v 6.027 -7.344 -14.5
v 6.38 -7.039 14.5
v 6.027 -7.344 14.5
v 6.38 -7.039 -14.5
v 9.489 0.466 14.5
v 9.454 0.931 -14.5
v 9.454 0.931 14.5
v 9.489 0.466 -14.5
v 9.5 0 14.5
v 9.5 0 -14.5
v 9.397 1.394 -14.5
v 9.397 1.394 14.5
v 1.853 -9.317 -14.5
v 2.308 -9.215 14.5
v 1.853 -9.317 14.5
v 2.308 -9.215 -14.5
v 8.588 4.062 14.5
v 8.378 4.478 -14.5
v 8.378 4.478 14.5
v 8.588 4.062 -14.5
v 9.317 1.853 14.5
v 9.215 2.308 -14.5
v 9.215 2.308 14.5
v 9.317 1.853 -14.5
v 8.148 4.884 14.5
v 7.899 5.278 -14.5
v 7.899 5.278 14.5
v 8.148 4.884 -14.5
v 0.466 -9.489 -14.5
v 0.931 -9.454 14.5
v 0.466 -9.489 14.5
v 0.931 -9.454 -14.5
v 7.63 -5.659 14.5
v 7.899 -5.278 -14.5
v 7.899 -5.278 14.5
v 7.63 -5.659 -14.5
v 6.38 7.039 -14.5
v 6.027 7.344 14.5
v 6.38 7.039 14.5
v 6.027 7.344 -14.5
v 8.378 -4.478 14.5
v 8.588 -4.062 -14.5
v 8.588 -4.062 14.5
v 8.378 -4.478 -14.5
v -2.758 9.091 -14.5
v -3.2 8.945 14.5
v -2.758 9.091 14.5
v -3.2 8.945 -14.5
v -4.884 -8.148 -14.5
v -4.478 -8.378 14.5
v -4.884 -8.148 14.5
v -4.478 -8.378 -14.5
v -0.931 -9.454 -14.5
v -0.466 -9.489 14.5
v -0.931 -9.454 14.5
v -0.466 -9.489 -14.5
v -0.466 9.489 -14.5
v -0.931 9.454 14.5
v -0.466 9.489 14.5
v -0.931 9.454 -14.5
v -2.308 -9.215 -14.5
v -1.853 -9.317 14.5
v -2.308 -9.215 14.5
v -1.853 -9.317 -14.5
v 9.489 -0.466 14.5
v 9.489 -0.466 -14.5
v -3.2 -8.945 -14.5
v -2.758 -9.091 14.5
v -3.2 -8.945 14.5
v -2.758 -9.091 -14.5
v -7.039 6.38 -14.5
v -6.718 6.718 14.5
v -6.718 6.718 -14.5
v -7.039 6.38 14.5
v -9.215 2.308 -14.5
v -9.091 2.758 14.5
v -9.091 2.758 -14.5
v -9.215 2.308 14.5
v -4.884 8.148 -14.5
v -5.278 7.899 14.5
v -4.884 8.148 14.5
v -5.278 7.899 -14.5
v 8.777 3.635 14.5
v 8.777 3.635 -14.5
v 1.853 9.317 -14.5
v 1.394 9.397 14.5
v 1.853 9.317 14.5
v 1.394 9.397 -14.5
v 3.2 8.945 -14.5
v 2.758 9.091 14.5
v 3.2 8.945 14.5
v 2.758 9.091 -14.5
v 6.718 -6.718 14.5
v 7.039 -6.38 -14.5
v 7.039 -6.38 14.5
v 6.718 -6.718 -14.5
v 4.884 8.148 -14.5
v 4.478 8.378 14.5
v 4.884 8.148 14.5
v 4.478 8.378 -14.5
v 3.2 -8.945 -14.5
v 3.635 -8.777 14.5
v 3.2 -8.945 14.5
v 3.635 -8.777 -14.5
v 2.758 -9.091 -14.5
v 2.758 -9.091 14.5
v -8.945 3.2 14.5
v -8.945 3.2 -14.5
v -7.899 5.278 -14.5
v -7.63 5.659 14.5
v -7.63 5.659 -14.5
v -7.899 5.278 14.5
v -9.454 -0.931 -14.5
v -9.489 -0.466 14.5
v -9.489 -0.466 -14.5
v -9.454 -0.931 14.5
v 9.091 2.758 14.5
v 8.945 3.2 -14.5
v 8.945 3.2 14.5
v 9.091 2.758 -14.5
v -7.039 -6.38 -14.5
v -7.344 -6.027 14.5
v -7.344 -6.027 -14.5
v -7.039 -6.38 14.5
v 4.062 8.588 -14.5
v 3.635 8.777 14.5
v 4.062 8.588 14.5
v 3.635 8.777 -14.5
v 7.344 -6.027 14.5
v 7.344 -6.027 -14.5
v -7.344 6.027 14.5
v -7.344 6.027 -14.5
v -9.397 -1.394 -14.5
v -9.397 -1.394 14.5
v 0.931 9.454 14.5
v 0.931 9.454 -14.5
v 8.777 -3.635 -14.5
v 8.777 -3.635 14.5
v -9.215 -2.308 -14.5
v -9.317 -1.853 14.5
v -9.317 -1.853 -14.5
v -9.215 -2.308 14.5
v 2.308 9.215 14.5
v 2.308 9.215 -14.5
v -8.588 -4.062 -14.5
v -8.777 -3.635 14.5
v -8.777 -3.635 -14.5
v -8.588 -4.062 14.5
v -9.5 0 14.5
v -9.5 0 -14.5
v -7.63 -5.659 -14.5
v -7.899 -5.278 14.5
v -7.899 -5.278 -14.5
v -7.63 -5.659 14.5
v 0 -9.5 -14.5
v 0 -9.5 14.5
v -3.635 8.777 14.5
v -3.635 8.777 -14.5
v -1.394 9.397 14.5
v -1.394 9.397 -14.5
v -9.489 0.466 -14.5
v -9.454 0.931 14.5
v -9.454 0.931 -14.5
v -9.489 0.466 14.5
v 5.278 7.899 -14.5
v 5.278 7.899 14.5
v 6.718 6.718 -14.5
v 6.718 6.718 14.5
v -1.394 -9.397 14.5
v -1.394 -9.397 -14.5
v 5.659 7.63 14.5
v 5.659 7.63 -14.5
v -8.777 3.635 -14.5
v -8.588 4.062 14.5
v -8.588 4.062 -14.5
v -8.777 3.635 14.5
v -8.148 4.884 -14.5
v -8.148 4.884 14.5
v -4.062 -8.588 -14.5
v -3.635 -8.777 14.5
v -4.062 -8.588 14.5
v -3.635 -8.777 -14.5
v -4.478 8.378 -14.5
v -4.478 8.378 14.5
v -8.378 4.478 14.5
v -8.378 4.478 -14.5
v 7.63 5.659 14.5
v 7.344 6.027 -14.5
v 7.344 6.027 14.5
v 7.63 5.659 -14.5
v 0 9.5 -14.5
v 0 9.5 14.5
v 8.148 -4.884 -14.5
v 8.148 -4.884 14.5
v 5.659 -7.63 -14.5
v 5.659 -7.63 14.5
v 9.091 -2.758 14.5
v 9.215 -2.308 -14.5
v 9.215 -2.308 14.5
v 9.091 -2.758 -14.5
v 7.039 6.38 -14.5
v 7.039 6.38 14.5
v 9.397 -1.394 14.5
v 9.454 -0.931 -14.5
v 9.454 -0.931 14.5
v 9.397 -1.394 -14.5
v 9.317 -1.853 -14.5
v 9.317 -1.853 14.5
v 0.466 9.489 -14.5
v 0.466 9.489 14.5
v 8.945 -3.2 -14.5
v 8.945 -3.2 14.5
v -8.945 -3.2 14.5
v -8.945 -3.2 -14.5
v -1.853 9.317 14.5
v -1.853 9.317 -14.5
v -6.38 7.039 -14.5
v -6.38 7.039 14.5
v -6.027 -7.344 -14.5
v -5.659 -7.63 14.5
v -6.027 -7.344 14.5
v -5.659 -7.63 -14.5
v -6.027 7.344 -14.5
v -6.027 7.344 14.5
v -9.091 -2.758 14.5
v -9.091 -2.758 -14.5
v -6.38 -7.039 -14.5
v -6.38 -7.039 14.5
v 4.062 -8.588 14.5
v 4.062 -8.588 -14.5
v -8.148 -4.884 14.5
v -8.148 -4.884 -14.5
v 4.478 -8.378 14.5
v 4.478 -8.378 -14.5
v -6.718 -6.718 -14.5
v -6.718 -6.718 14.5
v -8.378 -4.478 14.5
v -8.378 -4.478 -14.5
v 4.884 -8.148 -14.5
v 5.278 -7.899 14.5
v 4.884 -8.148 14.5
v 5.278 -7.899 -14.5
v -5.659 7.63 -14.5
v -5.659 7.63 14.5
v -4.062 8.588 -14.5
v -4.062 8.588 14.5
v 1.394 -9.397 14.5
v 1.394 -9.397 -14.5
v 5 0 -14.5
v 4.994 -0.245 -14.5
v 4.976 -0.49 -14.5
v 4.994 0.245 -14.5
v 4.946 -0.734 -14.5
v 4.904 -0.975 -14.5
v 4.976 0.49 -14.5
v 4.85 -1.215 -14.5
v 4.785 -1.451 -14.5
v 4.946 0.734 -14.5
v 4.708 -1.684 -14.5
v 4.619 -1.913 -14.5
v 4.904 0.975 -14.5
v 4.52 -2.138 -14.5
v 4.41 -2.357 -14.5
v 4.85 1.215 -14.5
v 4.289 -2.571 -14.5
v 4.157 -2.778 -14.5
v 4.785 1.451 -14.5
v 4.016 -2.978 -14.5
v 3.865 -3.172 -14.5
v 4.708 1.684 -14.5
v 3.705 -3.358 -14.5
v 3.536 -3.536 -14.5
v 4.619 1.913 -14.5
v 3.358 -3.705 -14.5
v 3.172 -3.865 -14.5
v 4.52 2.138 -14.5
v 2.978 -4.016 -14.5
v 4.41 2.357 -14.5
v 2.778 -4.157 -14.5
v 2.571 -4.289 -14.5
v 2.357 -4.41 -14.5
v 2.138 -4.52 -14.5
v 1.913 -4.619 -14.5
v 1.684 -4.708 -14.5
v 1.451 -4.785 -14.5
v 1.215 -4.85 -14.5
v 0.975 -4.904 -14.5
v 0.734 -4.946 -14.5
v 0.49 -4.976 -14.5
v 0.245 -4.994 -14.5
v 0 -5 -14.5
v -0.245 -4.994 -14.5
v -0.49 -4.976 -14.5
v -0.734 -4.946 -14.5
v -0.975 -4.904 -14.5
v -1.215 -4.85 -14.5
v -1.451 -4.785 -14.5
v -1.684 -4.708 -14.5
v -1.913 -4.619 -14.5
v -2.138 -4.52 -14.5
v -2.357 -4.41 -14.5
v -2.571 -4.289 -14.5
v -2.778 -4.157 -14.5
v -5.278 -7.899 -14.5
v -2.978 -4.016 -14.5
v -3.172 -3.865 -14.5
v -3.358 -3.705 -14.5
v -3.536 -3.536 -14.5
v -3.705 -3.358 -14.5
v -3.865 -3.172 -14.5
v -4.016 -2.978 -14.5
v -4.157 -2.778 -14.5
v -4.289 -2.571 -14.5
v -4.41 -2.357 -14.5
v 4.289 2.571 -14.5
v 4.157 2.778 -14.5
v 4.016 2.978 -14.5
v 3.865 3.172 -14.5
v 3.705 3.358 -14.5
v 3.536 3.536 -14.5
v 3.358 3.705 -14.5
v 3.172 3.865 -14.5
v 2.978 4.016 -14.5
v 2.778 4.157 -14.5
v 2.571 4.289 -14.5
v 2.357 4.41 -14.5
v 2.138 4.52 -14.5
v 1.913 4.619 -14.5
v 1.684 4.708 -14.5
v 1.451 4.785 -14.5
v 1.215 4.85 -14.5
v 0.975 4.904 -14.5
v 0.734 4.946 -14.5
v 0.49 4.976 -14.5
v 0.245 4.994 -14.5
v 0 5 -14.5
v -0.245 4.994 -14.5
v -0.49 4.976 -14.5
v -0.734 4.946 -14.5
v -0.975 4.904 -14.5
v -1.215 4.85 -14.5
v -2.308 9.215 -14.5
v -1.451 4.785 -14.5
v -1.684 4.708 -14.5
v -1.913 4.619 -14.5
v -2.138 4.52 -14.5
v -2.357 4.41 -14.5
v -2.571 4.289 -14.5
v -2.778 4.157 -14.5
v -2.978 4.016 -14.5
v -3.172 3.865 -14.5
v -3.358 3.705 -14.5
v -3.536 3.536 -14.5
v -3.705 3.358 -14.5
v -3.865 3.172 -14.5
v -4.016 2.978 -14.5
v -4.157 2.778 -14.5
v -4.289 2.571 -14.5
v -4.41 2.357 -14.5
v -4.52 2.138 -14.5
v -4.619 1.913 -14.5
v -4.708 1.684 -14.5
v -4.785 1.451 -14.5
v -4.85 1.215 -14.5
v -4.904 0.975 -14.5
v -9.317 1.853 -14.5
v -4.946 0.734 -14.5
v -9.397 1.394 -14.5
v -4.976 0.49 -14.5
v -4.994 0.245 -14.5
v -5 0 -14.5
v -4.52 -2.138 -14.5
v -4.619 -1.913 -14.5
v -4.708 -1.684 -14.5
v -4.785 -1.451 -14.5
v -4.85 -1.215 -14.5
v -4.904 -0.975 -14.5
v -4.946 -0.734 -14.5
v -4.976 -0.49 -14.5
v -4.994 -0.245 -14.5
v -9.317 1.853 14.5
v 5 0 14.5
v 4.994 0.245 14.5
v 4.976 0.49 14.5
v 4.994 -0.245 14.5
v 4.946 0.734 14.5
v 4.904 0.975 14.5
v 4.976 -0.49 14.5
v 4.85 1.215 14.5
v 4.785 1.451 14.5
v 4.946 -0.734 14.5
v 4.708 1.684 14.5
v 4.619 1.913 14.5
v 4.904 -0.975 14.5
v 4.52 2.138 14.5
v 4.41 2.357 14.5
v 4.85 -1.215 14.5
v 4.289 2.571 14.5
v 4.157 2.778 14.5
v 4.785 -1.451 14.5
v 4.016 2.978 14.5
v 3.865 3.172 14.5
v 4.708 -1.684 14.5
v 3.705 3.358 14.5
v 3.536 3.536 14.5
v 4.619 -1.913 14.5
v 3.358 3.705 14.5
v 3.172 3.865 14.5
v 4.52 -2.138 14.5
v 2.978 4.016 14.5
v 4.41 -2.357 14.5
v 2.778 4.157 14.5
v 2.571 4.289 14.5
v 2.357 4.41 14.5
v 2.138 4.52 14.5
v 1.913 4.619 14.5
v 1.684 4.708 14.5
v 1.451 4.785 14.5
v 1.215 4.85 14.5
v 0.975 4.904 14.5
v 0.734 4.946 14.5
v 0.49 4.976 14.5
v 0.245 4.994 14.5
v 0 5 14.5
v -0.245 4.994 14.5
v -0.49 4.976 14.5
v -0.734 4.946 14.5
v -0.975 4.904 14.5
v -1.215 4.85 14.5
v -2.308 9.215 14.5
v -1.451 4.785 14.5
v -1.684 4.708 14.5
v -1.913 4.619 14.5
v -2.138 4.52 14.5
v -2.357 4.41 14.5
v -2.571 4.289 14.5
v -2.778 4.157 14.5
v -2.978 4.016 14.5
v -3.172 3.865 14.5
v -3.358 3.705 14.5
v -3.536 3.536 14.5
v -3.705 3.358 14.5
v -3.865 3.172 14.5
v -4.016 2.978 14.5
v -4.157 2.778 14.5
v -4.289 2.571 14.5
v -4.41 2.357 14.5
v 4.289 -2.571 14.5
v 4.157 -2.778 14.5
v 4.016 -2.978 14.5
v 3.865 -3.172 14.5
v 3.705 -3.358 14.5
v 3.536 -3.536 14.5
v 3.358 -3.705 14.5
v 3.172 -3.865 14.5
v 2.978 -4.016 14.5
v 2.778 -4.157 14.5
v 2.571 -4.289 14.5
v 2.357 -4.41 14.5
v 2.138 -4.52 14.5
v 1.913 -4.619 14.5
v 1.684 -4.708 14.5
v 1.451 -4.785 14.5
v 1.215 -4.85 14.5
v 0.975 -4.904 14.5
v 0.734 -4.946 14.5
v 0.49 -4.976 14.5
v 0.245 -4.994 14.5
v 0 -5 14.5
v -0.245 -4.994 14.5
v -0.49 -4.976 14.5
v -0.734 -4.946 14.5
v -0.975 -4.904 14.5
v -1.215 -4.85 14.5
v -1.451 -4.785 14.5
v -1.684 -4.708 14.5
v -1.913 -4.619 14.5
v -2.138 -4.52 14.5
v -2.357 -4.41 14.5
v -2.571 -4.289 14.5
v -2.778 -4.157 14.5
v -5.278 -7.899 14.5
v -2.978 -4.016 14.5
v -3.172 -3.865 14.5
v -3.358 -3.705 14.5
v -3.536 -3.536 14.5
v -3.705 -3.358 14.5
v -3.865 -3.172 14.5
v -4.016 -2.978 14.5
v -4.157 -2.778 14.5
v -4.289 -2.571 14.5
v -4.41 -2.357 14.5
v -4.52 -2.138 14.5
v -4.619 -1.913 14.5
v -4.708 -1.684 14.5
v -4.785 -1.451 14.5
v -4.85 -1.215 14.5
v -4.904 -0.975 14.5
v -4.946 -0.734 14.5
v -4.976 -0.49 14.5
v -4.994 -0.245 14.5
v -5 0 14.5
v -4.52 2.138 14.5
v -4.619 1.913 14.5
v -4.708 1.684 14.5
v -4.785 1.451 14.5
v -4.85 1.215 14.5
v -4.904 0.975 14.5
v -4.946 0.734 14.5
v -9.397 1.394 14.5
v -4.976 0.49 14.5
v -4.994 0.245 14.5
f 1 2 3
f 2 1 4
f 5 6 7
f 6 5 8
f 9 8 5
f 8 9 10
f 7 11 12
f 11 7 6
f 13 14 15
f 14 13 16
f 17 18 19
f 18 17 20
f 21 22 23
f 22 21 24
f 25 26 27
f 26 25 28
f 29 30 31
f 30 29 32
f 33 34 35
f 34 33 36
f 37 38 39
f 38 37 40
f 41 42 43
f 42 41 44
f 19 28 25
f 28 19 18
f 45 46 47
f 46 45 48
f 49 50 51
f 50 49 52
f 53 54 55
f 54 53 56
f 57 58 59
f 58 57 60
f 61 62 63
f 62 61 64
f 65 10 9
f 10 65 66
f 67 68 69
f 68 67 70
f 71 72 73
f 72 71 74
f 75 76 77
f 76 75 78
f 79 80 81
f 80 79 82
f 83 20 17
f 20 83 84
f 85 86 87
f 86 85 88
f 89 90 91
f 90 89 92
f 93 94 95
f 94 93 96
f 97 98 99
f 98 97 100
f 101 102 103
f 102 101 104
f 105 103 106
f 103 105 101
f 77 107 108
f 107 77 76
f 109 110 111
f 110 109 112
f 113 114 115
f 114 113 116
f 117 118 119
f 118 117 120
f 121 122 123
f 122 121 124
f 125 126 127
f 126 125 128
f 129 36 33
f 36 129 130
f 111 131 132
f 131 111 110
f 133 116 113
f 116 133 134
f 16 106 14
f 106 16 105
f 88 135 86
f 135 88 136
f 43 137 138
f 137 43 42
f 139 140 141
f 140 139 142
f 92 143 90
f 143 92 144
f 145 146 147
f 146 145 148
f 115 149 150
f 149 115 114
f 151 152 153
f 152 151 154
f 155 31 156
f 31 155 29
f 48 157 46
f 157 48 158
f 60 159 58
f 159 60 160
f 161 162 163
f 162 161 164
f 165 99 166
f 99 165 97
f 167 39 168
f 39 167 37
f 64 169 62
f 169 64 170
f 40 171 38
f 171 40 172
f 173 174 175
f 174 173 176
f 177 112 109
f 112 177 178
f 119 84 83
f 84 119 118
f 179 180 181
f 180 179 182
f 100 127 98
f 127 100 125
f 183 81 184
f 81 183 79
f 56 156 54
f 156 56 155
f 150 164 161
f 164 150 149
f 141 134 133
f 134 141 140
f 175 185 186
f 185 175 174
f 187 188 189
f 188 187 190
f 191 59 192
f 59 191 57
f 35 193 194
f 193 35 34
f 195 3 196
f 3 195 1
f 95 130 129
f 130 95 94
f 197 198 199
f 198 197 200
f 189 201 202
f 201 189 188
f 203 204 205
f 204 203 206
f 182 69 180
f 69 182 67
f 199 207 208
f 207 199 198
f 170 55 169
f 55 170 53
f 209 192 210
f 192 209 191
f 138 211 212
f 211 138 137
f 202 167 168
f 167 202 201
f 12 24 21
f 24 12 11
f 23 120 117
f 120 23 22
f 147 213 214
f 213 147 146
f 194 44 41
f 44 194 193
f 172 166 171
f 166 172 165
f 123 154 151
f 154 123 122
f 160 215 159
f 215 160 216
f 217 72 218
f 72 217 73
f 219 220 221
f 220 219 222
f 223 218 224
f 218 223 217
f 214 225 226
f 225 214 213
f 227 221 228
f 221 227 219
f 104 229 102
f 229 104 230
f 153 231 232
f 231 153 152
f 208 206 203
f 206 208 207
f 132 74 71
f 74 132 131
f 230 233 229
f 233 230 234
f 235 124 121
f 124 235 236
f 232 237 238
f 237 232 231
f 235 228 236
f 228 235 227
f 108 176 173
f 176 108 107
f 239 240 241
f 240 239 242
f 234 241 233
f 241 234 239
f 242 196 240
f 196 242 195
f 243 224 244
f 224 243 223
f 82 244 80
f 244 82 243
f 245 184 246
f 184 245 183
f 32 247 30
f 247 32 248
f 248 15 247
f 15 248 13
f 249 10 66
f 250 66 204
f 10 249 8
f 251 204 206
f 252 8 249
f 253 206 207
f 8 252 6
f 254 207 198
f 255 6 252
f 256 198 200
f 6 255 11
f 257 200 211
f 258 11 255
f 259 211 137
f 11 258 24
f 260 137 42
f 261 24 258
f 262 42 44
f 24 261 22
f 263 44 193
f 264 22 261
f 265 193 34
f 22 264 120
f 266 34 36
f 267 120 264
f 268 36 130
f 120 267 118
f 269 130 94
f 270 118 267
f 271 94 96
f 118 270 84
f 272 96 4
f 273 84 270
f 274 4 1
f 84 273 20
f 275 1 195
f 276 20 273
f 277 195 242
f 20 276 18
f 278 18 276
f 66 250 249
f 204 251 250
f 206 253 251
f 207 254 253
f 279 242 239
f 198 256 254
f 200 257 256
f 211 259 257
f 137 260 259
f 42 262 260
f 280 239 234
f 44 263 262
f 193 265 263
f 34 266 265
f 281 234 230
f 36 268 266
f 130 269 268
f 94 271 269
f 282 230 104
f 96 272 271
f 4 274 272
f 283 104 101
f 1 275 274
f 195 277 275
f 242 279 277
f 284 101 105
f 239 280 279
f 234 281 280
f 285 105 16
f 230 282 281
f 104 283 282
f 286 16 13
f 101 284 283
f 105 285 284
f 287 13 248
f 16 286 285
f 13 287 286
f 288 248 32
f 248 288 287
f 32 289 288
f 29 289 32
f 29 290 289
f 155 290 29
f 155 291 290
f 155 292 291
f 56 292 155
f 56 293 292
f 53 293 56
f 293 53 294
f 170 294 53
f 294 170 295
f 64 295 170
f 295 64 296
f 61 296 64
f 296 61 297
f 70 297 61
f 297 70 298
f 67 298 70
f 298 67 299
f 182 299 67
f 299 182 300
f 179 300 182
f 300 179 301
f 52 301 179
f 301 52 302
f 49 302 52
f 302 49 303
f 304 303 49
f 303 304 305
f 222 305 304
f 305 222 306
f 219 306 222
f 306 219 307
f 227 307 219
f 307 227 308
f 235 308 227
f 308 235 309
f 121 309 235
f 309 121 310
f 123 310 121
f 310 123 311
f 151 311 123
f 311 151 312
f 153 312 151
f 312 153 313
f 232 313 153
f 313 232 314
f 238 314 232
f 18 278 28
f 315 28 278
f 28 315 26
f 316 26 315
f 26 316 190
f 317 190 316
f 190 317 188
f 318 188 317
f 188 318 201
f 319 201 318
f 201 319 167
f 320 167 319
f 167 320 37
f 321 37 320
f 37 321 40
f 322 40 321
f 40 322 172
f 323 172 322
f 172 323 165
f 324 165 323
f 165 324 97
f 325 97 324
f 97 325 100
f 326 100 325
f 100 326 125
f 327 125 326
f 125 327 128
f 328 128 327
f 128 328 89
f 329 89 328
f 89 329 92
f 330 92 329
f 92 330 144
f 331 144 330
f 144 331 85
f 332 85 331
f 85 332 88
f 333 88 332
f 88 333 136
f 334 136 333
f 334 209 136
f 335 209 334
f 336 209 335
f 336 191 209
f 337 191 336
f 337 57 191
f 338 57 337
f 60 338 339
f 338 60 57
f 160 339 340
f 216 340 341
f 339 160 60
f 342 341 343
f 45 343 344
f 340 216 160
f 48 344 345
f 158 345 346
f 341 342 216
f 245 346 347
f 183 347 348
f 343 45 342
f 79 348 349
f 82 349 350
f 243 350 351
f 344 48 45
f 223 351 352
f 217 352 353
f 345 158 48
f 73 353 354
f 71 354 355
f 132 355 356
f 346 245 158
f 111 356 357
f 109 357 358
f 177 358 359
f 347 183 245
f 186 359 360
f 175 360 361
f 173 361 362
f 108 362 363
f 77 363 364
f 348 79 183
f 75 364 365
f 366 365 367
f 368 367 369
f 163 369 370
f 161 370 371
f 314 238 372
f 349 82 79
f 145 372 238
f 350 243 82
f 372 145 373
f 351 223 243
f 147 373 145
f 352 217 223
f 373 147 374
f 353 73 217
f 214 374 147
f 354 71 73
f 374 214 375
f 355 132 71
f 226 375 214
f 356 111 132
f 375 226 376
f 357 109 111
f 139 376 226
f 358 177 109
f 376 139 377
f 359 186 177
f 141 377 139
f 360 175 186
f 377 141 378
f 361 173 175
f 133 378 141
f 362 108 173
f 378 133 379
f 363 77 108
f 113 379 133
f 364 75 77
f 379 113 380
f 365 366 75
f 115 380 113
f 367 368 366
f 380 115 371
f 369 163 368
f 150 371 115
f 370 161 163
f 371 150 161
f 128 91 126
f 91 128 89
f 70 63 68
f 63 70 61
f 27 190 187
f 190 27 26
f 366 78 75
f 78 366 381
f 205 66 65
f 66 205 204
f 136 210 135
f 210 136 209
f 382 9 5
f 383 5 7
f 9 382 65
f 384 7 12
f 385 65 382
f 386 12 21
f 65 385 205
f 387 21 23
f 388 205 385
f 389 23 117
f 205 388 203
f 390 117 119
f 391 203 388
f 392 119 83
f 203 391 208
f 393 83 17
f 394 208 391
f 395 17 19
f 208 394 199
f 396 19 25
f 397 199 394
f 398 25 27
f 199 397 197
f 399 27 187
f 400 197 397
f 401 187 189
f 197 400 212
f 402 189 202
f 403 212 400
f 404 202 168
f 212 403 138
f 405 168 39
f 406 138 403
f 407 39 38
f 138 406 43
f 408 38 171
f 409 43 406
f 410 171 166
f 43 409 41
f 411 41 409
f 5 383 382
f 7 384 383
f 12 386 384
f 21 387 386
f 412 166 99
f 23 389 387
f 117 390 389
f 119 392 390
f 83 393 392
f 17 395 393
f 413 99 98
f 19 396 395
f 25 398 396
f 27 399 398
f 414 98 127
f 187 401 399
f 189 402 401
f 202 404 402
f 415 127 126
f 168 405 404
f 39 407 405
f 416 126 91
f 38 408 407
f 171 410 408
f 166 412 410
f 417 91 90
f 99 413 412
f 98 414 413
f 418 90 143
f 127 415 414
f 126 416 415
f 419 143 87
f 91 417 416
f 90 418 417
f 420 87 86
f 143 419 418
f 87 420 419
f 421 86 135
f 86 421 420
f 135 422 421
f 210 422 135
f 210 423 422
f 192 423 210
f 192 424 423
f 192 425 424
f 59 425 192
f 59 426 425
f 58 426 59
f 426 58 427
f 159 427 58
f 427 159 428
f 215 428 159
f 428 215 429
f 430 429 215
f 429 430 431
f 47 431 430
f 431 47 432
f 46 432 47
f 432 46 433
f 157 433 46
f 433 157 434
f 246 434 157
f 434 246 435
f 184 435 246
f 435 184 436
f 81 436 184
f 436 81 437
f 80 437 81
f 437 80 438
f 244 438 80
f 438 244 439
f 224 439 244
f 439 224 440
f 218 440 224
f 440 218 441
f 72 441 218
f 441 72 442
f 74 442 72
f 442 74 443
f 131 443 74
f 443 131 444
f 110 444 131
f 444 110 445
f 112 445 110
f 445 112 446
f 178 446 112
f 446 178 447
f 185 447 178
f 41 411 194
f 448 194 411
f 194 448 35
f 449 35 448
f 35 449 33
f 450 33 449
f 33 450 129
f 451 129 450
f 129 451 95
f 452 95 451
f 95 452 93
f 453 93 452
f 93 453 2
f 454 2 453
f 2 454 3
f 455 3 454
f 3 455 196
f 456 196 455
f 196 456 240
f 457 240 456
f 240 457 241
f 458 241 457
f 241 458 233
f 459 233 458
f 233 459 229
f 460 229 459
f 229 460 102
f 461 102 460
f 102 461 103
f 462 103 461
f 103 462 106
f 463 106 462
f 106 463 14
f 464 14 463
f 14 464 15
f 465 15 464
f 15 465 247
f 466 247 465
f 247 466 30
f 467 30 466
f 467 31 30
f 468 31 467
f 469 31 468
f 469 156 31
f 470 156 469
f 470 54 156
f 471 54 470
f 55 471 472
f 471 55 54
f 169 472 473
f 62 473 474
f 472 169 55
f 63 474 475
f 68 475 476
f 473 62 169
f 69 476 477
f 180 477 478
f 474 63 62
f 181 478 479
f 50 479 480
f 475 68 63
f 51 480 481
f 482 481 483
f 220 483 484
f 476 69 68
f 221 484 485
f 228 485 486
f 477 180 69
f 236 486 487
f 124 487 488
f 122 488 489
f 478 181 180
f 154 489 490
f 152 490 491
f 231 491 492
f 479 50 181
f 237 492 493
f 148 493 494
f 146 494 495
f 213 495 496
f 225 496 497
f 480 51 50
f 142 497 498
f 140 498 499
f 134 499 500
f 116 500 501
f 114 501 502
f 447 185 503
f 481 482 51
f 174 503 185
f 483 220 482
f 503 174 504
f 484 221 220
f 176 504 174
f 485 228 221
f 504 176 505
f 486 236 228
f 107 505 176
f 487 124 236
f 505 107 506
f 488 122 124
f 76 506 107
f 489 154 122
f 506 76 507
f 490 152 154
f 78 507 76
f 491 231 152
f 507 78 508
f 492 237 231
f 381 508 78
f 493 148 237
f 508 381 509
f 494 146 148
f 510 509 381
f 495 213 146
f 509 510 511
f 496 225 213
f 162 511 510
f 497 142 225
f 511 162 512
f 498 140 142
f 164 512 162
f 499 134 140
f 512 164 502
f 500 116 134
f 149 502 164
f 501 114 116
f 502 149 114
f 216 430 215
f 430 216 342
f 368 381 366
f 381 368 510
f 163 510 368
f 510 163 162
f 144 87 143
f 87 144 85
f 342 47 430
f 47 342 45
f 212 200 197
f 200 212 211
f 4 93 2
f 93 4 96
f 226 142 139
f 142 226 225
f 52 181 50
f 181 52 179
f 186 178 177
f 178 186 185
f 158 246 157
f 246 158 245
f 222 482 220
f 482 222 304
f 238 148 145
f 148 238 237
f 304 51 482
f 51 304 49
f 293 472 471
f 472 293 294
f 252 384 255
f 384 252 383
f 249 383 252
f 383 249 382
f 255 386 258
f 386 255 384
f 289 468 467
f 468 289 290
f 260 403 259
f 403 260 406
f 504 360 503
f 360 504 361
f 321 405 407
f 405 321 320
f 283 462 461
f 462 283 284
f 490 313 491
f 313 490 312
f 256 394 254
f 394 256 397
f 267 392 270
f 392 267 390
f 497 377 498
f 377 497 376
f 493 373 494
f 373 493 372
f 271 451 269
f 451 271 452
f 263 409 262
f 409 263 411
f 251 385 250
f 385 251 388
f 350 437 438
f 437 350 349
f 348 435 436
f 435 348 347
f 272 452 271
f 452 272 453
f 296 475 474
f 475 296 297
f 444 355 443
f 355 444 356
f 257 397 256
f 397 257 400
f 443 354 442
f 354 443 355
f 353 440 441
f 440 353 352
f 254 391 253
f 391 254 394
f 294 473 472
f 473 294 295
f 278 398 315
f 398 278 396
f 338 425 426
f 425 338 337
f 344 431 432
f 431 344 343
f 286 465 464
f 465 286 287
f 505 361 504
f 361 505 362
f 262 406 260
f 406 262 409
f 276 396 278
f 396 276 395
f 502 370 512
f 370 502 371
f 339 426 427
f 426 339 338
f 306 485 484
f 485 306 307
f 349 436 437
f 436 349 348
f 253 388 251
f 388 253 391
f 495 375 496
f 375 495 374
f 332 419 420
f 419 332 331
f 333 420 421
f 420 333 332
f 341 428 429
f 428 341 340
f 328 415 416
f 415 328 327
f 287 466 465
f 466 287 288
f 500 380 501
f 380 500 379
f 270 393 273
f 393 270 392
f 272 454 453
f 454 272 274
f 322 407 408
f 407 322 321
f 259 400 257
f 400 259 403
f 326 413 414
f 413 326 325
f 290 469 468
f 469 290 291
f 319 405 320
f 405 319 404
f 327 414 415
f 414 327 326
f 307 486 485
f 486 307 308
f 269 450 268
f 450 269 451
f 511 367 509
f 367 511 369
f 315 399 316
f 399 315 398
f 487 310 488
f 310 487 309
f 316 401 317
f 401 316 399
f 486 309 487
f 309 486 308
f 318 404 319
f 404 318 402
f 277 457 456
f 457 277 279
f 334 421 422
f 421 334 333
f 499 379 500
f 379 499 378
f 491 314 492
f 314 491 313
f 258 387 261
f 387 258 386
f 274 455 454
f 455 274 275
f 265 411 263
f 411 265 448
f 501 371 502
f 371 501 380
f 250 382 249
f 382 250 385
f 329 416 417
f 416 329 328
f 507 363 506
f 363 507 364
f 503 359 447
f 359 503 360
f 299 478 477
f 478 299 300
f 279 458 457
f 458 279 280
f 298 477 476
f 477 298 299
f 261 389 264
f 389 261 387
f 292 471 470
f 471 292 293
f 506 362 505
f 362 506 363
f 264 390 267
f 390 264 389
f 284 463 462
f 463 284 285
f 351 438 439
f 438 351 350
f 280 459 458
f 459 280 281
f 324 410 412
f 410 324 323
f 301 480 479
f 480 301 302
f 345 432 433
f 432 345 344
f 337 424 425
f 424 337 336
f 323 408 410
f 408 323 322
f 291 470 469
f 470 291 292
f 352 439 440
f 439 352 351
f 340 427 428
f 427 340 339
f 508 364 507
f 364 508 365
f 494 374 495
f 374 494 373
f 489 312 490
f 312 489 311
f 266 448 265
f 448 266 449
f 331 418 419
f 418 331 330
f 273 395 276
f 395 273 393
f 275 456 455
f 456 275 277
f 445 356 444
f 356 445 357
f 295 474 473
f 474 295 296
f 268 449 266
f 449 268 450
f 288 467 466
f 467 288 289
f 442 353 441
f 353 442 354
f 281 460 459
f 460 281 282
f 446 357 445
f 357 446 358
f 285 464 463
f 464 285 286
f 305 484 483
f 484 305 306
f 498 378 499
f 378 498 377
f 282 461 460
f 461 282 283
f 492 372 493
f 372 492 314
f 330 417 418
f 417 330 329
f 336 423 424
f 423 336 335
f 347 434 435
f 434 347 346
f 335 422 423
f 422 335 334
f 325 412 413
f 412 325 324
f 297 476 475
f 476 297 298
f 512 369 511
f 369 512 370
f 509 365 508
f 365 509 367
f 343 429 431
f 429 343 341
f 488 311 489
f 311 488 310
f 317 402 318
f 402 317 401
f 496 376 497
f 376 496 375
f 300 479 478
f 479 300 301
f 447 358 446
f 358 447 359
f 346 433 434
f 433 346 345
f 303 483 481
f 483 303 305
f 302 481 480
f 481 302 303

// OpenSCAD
// Linear bearing (simple sleeve) — 10mm bore, 19mm OD, 29mm length

bore_diameter_mm  = 10.0;  //[5:20:0.1]
outer_diameter_mm = 19.0;  //[10:38:0.1]
length_mm         = 29.0;  //[15:58:0.1]

overlap_mm        = 0.2;   //[0.05:1:0.05]
bore_clearance_mm = 0.0;   //[0:0.5:0.05]

$fn = 128;

module linear_bearing_sleeve() {
    difference() {
        // Outer cylinder
        cylinder(h=length_mm, r=outer_diameter_mm/2, center=true);

        // Through bore
        cylinder(h=length_mm + 2*overlap_mm,
                 r=(bore_diameter_mm + bore_clearance_mm)/2,
                 center=true);
    }
}

linear_bearing_sleeve();
